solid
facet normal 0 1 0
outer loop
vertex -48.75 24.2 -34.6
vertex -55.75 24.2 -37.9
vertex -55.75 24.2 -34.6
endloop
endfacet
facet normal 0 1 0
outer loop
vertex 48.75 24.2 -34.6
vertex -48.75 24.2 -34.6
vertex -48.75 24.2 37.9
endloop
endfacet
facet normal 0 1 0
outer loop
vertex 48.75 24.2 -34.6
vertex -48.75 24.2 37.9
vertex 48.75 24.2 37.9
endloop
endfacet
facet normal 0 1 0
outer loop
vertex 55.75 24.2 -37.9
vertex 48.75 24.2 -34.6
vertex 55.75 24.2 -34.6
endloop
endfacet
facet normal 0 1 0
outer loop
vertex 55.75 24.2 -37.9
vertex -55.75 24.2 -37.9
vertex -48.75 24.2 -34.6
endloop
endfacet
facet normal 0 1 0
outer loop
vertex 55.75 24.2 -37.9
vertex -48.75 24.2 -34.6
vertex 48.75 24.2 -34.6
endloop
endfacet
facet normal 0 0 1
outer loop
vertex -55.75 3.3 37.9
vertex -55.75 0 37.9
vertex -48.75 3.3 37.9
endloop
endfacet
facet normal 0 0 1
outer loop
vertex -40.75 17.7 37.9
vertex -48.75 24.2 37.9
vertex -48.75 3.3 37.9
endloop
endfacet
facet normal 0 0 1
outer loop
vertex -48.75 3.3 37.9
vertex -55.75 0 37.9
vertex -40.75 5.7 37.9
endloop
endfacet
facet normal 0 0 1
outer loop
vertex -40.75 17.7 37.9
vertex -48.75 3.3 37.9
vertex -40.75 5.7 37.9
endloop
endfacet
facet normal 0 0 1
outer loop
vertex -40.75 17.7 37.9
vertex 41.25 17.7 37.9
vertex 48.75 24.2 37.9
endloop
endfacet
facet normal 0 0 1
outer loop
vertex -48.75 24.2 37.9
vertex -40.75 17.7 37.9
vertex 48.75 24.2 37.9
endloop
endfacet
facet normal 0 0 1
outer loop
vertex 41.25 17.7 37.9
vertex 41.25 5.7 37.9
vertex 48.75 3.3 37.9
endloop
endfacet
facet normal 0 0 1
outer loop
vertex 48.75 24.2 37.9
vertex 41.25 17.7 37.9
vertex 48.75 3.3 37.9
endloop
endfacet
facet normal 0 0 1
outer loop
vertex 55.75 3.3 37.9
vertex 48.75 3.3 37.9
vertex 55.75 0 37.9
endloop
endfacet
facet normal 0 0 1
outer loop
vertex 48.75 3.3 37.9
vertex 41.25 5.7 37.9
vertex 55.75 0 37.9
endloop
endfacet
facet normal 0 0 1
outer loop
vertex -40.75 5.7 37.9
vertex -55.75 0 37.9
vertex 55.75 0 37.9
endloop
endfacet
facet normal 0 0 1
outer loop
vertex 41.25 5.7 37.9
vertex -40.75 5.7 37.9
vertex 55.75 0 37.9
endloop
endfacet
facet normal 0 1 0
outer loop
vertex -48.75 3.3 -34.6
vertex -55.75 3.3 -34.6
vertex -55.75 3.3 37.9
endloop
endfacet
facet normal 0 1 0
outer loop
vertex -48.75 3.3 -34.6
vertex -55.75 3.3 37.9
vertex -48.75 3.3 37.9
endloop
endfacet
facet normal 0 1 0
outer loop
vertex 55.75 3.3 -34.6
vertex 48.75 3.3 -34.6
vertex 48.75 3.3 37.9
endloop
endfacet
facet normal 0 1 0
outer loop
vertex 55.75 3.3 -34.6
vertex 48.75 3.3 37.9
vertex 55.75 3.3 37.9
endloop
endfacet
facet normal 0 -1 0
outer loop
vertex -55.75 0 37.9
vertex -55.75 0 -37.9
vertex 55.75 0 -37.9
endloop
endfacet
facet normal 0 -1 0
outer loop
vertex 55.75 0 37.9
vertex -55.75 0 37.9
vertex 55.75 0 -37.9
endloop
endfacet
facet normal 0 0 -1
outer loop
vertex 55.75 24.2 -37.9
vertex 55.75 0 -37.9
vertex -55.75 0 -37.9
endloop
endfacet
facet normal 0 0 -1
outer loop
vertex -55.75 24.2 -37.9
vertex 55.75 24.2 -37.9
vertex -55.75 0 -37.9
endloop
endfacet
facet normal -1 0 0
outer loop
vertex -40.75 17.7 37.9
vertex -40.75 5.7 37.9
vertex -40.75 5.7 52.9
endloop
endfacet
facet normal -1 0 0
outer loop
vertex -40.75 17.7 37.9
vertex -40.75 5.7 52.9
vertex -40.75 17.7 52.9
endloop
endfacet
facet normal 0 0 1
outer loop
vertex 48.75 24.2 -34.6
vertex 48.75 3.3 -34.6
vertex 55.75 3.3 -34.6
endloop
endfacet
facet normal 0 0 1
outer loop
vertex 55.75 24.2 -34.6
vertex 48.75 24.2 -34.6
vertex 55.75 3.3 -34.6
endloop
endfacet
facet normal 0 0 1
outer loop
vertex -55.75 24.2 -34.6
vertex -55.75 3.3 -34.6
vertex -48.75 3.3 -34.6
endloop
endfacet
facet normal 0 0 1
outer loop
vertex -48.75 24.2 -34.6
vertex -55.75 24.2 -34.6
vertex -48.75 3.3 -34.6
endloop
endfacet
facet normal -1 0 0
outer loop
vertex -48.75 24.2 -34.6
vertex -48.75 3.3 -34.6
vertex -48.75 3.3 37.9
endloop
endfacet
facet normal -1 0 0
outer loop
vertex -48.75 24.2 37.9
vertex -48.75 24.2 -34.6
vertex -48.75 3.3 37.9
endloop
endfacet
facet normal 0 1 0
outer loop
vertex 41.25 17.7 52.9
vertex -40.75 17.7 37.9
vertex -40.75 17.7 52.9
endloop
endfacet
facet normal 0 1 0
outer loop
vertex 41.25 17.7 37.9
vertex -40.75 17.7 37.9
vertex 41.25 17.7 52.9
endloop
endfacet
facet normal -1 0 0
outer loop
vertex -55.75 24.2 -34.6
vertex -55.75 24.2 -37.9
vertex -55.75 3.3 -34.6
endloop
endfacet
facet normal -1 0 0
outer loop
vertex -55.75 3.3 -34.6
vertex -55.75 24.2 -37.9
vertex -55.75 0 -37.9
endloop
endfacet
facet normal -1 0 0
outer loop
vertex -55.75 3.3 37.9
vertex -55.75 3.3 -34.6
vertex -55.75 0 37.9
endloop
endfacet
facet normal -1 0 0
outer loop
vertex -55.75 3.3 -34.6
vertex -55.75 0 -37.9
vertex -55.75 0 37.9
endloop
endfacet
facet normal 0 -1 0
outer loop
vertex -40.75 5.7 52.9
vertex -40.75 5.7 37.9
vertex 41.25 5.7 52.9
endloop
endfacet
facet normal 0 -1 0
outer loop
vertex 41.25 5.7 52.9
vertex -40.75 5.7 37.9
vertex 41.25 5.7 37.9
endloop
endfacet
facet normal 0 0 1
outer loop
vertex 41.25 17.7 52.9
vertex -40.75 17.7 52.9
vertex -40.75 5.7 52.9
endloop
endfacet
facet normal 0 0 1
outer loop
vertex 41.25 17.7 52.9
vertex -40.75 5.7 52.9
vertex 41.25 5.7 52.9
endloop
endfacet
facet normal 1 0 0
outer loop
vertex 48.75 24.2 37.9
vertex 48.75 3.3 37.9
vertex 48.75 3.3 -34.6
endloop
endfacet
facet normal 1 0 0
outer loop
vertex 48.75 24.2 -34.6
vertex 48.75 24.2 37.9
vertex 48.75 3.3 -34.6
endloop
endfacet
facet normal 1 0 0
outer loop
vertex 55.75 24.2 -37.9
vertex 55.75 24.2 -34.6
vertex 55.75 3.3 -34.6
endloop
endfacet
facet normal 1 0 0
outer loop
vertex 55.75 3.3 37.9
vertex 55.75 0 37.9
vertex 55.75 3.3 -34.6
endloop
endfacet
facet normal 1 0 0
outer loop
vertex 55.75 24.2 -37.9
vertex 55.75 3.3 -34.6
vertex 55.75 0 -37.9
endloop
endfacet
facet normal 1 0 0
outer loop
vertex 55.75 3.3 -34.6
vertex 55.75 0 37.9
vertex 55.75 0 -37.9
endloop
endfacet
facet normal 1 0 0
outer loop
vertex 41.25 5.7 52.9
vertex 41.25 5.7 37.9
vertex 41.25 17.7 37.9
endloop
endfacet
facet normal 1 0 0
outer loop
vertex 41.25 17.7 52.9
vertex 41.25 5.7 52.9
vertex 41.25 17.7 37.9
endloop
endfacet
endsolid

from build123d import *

# Parameters (mm, degrees)
SKETCH1_W           = 111.5
SKETCH1_H           = 75.8
BOSS_EXTRUDE1_DEPTH = 3.3
BOSS_EXTRUDE2_DEPTH = 20.9
SKETCH3_W           = 82
SKETCH3_H           = 12
BOSS_EXTRUDE3_DEPTH = 15


with BuildPart() as part:
    # Sketch1 → Boss-Extrude1 (new body)
    with BuildSketch(Plane(origin=(0, 0, 0), x_dir=(1, 0, 0), z_dir=(0, 1, 0))):
        Rectangle(SKETCH1_W, SKETCH1_H)
    extrude(amount=BOSS_EXTRUDE1_DEPTH)

    # Sketch2 → Boss-Extrude2 (add)
    with BuildSketch(Plane(origin=(0, 3.3, 0), x_dir=(1, 0, 0), z_dir=(0, 1, 0))):
        Polygon((48.75, 37.9), (-48.75, 37.9), (-55.75, 37.9), (-55.75, 34.6), (-48.75, 34.6), (-48.75, -37.9), (48.75, -37.9), (48.75, 34.6), (55.75, 34.6), (55.75, 37.9), align=None)
    extrude(amount=BOSS_EXTRUDE2_DEPTH)

    # Sketch3 → Boss-Extrude3 (add)
    with BuildSketch(Plane.XY.offset(37.9)):
        with Locations((0.25, 11.7)):
            Rectangle(SKETCH3_W, SKETCH3_H)
    extrude(amount=BOSS_EXTRUDE3_DEPTH)


solid = part.part
